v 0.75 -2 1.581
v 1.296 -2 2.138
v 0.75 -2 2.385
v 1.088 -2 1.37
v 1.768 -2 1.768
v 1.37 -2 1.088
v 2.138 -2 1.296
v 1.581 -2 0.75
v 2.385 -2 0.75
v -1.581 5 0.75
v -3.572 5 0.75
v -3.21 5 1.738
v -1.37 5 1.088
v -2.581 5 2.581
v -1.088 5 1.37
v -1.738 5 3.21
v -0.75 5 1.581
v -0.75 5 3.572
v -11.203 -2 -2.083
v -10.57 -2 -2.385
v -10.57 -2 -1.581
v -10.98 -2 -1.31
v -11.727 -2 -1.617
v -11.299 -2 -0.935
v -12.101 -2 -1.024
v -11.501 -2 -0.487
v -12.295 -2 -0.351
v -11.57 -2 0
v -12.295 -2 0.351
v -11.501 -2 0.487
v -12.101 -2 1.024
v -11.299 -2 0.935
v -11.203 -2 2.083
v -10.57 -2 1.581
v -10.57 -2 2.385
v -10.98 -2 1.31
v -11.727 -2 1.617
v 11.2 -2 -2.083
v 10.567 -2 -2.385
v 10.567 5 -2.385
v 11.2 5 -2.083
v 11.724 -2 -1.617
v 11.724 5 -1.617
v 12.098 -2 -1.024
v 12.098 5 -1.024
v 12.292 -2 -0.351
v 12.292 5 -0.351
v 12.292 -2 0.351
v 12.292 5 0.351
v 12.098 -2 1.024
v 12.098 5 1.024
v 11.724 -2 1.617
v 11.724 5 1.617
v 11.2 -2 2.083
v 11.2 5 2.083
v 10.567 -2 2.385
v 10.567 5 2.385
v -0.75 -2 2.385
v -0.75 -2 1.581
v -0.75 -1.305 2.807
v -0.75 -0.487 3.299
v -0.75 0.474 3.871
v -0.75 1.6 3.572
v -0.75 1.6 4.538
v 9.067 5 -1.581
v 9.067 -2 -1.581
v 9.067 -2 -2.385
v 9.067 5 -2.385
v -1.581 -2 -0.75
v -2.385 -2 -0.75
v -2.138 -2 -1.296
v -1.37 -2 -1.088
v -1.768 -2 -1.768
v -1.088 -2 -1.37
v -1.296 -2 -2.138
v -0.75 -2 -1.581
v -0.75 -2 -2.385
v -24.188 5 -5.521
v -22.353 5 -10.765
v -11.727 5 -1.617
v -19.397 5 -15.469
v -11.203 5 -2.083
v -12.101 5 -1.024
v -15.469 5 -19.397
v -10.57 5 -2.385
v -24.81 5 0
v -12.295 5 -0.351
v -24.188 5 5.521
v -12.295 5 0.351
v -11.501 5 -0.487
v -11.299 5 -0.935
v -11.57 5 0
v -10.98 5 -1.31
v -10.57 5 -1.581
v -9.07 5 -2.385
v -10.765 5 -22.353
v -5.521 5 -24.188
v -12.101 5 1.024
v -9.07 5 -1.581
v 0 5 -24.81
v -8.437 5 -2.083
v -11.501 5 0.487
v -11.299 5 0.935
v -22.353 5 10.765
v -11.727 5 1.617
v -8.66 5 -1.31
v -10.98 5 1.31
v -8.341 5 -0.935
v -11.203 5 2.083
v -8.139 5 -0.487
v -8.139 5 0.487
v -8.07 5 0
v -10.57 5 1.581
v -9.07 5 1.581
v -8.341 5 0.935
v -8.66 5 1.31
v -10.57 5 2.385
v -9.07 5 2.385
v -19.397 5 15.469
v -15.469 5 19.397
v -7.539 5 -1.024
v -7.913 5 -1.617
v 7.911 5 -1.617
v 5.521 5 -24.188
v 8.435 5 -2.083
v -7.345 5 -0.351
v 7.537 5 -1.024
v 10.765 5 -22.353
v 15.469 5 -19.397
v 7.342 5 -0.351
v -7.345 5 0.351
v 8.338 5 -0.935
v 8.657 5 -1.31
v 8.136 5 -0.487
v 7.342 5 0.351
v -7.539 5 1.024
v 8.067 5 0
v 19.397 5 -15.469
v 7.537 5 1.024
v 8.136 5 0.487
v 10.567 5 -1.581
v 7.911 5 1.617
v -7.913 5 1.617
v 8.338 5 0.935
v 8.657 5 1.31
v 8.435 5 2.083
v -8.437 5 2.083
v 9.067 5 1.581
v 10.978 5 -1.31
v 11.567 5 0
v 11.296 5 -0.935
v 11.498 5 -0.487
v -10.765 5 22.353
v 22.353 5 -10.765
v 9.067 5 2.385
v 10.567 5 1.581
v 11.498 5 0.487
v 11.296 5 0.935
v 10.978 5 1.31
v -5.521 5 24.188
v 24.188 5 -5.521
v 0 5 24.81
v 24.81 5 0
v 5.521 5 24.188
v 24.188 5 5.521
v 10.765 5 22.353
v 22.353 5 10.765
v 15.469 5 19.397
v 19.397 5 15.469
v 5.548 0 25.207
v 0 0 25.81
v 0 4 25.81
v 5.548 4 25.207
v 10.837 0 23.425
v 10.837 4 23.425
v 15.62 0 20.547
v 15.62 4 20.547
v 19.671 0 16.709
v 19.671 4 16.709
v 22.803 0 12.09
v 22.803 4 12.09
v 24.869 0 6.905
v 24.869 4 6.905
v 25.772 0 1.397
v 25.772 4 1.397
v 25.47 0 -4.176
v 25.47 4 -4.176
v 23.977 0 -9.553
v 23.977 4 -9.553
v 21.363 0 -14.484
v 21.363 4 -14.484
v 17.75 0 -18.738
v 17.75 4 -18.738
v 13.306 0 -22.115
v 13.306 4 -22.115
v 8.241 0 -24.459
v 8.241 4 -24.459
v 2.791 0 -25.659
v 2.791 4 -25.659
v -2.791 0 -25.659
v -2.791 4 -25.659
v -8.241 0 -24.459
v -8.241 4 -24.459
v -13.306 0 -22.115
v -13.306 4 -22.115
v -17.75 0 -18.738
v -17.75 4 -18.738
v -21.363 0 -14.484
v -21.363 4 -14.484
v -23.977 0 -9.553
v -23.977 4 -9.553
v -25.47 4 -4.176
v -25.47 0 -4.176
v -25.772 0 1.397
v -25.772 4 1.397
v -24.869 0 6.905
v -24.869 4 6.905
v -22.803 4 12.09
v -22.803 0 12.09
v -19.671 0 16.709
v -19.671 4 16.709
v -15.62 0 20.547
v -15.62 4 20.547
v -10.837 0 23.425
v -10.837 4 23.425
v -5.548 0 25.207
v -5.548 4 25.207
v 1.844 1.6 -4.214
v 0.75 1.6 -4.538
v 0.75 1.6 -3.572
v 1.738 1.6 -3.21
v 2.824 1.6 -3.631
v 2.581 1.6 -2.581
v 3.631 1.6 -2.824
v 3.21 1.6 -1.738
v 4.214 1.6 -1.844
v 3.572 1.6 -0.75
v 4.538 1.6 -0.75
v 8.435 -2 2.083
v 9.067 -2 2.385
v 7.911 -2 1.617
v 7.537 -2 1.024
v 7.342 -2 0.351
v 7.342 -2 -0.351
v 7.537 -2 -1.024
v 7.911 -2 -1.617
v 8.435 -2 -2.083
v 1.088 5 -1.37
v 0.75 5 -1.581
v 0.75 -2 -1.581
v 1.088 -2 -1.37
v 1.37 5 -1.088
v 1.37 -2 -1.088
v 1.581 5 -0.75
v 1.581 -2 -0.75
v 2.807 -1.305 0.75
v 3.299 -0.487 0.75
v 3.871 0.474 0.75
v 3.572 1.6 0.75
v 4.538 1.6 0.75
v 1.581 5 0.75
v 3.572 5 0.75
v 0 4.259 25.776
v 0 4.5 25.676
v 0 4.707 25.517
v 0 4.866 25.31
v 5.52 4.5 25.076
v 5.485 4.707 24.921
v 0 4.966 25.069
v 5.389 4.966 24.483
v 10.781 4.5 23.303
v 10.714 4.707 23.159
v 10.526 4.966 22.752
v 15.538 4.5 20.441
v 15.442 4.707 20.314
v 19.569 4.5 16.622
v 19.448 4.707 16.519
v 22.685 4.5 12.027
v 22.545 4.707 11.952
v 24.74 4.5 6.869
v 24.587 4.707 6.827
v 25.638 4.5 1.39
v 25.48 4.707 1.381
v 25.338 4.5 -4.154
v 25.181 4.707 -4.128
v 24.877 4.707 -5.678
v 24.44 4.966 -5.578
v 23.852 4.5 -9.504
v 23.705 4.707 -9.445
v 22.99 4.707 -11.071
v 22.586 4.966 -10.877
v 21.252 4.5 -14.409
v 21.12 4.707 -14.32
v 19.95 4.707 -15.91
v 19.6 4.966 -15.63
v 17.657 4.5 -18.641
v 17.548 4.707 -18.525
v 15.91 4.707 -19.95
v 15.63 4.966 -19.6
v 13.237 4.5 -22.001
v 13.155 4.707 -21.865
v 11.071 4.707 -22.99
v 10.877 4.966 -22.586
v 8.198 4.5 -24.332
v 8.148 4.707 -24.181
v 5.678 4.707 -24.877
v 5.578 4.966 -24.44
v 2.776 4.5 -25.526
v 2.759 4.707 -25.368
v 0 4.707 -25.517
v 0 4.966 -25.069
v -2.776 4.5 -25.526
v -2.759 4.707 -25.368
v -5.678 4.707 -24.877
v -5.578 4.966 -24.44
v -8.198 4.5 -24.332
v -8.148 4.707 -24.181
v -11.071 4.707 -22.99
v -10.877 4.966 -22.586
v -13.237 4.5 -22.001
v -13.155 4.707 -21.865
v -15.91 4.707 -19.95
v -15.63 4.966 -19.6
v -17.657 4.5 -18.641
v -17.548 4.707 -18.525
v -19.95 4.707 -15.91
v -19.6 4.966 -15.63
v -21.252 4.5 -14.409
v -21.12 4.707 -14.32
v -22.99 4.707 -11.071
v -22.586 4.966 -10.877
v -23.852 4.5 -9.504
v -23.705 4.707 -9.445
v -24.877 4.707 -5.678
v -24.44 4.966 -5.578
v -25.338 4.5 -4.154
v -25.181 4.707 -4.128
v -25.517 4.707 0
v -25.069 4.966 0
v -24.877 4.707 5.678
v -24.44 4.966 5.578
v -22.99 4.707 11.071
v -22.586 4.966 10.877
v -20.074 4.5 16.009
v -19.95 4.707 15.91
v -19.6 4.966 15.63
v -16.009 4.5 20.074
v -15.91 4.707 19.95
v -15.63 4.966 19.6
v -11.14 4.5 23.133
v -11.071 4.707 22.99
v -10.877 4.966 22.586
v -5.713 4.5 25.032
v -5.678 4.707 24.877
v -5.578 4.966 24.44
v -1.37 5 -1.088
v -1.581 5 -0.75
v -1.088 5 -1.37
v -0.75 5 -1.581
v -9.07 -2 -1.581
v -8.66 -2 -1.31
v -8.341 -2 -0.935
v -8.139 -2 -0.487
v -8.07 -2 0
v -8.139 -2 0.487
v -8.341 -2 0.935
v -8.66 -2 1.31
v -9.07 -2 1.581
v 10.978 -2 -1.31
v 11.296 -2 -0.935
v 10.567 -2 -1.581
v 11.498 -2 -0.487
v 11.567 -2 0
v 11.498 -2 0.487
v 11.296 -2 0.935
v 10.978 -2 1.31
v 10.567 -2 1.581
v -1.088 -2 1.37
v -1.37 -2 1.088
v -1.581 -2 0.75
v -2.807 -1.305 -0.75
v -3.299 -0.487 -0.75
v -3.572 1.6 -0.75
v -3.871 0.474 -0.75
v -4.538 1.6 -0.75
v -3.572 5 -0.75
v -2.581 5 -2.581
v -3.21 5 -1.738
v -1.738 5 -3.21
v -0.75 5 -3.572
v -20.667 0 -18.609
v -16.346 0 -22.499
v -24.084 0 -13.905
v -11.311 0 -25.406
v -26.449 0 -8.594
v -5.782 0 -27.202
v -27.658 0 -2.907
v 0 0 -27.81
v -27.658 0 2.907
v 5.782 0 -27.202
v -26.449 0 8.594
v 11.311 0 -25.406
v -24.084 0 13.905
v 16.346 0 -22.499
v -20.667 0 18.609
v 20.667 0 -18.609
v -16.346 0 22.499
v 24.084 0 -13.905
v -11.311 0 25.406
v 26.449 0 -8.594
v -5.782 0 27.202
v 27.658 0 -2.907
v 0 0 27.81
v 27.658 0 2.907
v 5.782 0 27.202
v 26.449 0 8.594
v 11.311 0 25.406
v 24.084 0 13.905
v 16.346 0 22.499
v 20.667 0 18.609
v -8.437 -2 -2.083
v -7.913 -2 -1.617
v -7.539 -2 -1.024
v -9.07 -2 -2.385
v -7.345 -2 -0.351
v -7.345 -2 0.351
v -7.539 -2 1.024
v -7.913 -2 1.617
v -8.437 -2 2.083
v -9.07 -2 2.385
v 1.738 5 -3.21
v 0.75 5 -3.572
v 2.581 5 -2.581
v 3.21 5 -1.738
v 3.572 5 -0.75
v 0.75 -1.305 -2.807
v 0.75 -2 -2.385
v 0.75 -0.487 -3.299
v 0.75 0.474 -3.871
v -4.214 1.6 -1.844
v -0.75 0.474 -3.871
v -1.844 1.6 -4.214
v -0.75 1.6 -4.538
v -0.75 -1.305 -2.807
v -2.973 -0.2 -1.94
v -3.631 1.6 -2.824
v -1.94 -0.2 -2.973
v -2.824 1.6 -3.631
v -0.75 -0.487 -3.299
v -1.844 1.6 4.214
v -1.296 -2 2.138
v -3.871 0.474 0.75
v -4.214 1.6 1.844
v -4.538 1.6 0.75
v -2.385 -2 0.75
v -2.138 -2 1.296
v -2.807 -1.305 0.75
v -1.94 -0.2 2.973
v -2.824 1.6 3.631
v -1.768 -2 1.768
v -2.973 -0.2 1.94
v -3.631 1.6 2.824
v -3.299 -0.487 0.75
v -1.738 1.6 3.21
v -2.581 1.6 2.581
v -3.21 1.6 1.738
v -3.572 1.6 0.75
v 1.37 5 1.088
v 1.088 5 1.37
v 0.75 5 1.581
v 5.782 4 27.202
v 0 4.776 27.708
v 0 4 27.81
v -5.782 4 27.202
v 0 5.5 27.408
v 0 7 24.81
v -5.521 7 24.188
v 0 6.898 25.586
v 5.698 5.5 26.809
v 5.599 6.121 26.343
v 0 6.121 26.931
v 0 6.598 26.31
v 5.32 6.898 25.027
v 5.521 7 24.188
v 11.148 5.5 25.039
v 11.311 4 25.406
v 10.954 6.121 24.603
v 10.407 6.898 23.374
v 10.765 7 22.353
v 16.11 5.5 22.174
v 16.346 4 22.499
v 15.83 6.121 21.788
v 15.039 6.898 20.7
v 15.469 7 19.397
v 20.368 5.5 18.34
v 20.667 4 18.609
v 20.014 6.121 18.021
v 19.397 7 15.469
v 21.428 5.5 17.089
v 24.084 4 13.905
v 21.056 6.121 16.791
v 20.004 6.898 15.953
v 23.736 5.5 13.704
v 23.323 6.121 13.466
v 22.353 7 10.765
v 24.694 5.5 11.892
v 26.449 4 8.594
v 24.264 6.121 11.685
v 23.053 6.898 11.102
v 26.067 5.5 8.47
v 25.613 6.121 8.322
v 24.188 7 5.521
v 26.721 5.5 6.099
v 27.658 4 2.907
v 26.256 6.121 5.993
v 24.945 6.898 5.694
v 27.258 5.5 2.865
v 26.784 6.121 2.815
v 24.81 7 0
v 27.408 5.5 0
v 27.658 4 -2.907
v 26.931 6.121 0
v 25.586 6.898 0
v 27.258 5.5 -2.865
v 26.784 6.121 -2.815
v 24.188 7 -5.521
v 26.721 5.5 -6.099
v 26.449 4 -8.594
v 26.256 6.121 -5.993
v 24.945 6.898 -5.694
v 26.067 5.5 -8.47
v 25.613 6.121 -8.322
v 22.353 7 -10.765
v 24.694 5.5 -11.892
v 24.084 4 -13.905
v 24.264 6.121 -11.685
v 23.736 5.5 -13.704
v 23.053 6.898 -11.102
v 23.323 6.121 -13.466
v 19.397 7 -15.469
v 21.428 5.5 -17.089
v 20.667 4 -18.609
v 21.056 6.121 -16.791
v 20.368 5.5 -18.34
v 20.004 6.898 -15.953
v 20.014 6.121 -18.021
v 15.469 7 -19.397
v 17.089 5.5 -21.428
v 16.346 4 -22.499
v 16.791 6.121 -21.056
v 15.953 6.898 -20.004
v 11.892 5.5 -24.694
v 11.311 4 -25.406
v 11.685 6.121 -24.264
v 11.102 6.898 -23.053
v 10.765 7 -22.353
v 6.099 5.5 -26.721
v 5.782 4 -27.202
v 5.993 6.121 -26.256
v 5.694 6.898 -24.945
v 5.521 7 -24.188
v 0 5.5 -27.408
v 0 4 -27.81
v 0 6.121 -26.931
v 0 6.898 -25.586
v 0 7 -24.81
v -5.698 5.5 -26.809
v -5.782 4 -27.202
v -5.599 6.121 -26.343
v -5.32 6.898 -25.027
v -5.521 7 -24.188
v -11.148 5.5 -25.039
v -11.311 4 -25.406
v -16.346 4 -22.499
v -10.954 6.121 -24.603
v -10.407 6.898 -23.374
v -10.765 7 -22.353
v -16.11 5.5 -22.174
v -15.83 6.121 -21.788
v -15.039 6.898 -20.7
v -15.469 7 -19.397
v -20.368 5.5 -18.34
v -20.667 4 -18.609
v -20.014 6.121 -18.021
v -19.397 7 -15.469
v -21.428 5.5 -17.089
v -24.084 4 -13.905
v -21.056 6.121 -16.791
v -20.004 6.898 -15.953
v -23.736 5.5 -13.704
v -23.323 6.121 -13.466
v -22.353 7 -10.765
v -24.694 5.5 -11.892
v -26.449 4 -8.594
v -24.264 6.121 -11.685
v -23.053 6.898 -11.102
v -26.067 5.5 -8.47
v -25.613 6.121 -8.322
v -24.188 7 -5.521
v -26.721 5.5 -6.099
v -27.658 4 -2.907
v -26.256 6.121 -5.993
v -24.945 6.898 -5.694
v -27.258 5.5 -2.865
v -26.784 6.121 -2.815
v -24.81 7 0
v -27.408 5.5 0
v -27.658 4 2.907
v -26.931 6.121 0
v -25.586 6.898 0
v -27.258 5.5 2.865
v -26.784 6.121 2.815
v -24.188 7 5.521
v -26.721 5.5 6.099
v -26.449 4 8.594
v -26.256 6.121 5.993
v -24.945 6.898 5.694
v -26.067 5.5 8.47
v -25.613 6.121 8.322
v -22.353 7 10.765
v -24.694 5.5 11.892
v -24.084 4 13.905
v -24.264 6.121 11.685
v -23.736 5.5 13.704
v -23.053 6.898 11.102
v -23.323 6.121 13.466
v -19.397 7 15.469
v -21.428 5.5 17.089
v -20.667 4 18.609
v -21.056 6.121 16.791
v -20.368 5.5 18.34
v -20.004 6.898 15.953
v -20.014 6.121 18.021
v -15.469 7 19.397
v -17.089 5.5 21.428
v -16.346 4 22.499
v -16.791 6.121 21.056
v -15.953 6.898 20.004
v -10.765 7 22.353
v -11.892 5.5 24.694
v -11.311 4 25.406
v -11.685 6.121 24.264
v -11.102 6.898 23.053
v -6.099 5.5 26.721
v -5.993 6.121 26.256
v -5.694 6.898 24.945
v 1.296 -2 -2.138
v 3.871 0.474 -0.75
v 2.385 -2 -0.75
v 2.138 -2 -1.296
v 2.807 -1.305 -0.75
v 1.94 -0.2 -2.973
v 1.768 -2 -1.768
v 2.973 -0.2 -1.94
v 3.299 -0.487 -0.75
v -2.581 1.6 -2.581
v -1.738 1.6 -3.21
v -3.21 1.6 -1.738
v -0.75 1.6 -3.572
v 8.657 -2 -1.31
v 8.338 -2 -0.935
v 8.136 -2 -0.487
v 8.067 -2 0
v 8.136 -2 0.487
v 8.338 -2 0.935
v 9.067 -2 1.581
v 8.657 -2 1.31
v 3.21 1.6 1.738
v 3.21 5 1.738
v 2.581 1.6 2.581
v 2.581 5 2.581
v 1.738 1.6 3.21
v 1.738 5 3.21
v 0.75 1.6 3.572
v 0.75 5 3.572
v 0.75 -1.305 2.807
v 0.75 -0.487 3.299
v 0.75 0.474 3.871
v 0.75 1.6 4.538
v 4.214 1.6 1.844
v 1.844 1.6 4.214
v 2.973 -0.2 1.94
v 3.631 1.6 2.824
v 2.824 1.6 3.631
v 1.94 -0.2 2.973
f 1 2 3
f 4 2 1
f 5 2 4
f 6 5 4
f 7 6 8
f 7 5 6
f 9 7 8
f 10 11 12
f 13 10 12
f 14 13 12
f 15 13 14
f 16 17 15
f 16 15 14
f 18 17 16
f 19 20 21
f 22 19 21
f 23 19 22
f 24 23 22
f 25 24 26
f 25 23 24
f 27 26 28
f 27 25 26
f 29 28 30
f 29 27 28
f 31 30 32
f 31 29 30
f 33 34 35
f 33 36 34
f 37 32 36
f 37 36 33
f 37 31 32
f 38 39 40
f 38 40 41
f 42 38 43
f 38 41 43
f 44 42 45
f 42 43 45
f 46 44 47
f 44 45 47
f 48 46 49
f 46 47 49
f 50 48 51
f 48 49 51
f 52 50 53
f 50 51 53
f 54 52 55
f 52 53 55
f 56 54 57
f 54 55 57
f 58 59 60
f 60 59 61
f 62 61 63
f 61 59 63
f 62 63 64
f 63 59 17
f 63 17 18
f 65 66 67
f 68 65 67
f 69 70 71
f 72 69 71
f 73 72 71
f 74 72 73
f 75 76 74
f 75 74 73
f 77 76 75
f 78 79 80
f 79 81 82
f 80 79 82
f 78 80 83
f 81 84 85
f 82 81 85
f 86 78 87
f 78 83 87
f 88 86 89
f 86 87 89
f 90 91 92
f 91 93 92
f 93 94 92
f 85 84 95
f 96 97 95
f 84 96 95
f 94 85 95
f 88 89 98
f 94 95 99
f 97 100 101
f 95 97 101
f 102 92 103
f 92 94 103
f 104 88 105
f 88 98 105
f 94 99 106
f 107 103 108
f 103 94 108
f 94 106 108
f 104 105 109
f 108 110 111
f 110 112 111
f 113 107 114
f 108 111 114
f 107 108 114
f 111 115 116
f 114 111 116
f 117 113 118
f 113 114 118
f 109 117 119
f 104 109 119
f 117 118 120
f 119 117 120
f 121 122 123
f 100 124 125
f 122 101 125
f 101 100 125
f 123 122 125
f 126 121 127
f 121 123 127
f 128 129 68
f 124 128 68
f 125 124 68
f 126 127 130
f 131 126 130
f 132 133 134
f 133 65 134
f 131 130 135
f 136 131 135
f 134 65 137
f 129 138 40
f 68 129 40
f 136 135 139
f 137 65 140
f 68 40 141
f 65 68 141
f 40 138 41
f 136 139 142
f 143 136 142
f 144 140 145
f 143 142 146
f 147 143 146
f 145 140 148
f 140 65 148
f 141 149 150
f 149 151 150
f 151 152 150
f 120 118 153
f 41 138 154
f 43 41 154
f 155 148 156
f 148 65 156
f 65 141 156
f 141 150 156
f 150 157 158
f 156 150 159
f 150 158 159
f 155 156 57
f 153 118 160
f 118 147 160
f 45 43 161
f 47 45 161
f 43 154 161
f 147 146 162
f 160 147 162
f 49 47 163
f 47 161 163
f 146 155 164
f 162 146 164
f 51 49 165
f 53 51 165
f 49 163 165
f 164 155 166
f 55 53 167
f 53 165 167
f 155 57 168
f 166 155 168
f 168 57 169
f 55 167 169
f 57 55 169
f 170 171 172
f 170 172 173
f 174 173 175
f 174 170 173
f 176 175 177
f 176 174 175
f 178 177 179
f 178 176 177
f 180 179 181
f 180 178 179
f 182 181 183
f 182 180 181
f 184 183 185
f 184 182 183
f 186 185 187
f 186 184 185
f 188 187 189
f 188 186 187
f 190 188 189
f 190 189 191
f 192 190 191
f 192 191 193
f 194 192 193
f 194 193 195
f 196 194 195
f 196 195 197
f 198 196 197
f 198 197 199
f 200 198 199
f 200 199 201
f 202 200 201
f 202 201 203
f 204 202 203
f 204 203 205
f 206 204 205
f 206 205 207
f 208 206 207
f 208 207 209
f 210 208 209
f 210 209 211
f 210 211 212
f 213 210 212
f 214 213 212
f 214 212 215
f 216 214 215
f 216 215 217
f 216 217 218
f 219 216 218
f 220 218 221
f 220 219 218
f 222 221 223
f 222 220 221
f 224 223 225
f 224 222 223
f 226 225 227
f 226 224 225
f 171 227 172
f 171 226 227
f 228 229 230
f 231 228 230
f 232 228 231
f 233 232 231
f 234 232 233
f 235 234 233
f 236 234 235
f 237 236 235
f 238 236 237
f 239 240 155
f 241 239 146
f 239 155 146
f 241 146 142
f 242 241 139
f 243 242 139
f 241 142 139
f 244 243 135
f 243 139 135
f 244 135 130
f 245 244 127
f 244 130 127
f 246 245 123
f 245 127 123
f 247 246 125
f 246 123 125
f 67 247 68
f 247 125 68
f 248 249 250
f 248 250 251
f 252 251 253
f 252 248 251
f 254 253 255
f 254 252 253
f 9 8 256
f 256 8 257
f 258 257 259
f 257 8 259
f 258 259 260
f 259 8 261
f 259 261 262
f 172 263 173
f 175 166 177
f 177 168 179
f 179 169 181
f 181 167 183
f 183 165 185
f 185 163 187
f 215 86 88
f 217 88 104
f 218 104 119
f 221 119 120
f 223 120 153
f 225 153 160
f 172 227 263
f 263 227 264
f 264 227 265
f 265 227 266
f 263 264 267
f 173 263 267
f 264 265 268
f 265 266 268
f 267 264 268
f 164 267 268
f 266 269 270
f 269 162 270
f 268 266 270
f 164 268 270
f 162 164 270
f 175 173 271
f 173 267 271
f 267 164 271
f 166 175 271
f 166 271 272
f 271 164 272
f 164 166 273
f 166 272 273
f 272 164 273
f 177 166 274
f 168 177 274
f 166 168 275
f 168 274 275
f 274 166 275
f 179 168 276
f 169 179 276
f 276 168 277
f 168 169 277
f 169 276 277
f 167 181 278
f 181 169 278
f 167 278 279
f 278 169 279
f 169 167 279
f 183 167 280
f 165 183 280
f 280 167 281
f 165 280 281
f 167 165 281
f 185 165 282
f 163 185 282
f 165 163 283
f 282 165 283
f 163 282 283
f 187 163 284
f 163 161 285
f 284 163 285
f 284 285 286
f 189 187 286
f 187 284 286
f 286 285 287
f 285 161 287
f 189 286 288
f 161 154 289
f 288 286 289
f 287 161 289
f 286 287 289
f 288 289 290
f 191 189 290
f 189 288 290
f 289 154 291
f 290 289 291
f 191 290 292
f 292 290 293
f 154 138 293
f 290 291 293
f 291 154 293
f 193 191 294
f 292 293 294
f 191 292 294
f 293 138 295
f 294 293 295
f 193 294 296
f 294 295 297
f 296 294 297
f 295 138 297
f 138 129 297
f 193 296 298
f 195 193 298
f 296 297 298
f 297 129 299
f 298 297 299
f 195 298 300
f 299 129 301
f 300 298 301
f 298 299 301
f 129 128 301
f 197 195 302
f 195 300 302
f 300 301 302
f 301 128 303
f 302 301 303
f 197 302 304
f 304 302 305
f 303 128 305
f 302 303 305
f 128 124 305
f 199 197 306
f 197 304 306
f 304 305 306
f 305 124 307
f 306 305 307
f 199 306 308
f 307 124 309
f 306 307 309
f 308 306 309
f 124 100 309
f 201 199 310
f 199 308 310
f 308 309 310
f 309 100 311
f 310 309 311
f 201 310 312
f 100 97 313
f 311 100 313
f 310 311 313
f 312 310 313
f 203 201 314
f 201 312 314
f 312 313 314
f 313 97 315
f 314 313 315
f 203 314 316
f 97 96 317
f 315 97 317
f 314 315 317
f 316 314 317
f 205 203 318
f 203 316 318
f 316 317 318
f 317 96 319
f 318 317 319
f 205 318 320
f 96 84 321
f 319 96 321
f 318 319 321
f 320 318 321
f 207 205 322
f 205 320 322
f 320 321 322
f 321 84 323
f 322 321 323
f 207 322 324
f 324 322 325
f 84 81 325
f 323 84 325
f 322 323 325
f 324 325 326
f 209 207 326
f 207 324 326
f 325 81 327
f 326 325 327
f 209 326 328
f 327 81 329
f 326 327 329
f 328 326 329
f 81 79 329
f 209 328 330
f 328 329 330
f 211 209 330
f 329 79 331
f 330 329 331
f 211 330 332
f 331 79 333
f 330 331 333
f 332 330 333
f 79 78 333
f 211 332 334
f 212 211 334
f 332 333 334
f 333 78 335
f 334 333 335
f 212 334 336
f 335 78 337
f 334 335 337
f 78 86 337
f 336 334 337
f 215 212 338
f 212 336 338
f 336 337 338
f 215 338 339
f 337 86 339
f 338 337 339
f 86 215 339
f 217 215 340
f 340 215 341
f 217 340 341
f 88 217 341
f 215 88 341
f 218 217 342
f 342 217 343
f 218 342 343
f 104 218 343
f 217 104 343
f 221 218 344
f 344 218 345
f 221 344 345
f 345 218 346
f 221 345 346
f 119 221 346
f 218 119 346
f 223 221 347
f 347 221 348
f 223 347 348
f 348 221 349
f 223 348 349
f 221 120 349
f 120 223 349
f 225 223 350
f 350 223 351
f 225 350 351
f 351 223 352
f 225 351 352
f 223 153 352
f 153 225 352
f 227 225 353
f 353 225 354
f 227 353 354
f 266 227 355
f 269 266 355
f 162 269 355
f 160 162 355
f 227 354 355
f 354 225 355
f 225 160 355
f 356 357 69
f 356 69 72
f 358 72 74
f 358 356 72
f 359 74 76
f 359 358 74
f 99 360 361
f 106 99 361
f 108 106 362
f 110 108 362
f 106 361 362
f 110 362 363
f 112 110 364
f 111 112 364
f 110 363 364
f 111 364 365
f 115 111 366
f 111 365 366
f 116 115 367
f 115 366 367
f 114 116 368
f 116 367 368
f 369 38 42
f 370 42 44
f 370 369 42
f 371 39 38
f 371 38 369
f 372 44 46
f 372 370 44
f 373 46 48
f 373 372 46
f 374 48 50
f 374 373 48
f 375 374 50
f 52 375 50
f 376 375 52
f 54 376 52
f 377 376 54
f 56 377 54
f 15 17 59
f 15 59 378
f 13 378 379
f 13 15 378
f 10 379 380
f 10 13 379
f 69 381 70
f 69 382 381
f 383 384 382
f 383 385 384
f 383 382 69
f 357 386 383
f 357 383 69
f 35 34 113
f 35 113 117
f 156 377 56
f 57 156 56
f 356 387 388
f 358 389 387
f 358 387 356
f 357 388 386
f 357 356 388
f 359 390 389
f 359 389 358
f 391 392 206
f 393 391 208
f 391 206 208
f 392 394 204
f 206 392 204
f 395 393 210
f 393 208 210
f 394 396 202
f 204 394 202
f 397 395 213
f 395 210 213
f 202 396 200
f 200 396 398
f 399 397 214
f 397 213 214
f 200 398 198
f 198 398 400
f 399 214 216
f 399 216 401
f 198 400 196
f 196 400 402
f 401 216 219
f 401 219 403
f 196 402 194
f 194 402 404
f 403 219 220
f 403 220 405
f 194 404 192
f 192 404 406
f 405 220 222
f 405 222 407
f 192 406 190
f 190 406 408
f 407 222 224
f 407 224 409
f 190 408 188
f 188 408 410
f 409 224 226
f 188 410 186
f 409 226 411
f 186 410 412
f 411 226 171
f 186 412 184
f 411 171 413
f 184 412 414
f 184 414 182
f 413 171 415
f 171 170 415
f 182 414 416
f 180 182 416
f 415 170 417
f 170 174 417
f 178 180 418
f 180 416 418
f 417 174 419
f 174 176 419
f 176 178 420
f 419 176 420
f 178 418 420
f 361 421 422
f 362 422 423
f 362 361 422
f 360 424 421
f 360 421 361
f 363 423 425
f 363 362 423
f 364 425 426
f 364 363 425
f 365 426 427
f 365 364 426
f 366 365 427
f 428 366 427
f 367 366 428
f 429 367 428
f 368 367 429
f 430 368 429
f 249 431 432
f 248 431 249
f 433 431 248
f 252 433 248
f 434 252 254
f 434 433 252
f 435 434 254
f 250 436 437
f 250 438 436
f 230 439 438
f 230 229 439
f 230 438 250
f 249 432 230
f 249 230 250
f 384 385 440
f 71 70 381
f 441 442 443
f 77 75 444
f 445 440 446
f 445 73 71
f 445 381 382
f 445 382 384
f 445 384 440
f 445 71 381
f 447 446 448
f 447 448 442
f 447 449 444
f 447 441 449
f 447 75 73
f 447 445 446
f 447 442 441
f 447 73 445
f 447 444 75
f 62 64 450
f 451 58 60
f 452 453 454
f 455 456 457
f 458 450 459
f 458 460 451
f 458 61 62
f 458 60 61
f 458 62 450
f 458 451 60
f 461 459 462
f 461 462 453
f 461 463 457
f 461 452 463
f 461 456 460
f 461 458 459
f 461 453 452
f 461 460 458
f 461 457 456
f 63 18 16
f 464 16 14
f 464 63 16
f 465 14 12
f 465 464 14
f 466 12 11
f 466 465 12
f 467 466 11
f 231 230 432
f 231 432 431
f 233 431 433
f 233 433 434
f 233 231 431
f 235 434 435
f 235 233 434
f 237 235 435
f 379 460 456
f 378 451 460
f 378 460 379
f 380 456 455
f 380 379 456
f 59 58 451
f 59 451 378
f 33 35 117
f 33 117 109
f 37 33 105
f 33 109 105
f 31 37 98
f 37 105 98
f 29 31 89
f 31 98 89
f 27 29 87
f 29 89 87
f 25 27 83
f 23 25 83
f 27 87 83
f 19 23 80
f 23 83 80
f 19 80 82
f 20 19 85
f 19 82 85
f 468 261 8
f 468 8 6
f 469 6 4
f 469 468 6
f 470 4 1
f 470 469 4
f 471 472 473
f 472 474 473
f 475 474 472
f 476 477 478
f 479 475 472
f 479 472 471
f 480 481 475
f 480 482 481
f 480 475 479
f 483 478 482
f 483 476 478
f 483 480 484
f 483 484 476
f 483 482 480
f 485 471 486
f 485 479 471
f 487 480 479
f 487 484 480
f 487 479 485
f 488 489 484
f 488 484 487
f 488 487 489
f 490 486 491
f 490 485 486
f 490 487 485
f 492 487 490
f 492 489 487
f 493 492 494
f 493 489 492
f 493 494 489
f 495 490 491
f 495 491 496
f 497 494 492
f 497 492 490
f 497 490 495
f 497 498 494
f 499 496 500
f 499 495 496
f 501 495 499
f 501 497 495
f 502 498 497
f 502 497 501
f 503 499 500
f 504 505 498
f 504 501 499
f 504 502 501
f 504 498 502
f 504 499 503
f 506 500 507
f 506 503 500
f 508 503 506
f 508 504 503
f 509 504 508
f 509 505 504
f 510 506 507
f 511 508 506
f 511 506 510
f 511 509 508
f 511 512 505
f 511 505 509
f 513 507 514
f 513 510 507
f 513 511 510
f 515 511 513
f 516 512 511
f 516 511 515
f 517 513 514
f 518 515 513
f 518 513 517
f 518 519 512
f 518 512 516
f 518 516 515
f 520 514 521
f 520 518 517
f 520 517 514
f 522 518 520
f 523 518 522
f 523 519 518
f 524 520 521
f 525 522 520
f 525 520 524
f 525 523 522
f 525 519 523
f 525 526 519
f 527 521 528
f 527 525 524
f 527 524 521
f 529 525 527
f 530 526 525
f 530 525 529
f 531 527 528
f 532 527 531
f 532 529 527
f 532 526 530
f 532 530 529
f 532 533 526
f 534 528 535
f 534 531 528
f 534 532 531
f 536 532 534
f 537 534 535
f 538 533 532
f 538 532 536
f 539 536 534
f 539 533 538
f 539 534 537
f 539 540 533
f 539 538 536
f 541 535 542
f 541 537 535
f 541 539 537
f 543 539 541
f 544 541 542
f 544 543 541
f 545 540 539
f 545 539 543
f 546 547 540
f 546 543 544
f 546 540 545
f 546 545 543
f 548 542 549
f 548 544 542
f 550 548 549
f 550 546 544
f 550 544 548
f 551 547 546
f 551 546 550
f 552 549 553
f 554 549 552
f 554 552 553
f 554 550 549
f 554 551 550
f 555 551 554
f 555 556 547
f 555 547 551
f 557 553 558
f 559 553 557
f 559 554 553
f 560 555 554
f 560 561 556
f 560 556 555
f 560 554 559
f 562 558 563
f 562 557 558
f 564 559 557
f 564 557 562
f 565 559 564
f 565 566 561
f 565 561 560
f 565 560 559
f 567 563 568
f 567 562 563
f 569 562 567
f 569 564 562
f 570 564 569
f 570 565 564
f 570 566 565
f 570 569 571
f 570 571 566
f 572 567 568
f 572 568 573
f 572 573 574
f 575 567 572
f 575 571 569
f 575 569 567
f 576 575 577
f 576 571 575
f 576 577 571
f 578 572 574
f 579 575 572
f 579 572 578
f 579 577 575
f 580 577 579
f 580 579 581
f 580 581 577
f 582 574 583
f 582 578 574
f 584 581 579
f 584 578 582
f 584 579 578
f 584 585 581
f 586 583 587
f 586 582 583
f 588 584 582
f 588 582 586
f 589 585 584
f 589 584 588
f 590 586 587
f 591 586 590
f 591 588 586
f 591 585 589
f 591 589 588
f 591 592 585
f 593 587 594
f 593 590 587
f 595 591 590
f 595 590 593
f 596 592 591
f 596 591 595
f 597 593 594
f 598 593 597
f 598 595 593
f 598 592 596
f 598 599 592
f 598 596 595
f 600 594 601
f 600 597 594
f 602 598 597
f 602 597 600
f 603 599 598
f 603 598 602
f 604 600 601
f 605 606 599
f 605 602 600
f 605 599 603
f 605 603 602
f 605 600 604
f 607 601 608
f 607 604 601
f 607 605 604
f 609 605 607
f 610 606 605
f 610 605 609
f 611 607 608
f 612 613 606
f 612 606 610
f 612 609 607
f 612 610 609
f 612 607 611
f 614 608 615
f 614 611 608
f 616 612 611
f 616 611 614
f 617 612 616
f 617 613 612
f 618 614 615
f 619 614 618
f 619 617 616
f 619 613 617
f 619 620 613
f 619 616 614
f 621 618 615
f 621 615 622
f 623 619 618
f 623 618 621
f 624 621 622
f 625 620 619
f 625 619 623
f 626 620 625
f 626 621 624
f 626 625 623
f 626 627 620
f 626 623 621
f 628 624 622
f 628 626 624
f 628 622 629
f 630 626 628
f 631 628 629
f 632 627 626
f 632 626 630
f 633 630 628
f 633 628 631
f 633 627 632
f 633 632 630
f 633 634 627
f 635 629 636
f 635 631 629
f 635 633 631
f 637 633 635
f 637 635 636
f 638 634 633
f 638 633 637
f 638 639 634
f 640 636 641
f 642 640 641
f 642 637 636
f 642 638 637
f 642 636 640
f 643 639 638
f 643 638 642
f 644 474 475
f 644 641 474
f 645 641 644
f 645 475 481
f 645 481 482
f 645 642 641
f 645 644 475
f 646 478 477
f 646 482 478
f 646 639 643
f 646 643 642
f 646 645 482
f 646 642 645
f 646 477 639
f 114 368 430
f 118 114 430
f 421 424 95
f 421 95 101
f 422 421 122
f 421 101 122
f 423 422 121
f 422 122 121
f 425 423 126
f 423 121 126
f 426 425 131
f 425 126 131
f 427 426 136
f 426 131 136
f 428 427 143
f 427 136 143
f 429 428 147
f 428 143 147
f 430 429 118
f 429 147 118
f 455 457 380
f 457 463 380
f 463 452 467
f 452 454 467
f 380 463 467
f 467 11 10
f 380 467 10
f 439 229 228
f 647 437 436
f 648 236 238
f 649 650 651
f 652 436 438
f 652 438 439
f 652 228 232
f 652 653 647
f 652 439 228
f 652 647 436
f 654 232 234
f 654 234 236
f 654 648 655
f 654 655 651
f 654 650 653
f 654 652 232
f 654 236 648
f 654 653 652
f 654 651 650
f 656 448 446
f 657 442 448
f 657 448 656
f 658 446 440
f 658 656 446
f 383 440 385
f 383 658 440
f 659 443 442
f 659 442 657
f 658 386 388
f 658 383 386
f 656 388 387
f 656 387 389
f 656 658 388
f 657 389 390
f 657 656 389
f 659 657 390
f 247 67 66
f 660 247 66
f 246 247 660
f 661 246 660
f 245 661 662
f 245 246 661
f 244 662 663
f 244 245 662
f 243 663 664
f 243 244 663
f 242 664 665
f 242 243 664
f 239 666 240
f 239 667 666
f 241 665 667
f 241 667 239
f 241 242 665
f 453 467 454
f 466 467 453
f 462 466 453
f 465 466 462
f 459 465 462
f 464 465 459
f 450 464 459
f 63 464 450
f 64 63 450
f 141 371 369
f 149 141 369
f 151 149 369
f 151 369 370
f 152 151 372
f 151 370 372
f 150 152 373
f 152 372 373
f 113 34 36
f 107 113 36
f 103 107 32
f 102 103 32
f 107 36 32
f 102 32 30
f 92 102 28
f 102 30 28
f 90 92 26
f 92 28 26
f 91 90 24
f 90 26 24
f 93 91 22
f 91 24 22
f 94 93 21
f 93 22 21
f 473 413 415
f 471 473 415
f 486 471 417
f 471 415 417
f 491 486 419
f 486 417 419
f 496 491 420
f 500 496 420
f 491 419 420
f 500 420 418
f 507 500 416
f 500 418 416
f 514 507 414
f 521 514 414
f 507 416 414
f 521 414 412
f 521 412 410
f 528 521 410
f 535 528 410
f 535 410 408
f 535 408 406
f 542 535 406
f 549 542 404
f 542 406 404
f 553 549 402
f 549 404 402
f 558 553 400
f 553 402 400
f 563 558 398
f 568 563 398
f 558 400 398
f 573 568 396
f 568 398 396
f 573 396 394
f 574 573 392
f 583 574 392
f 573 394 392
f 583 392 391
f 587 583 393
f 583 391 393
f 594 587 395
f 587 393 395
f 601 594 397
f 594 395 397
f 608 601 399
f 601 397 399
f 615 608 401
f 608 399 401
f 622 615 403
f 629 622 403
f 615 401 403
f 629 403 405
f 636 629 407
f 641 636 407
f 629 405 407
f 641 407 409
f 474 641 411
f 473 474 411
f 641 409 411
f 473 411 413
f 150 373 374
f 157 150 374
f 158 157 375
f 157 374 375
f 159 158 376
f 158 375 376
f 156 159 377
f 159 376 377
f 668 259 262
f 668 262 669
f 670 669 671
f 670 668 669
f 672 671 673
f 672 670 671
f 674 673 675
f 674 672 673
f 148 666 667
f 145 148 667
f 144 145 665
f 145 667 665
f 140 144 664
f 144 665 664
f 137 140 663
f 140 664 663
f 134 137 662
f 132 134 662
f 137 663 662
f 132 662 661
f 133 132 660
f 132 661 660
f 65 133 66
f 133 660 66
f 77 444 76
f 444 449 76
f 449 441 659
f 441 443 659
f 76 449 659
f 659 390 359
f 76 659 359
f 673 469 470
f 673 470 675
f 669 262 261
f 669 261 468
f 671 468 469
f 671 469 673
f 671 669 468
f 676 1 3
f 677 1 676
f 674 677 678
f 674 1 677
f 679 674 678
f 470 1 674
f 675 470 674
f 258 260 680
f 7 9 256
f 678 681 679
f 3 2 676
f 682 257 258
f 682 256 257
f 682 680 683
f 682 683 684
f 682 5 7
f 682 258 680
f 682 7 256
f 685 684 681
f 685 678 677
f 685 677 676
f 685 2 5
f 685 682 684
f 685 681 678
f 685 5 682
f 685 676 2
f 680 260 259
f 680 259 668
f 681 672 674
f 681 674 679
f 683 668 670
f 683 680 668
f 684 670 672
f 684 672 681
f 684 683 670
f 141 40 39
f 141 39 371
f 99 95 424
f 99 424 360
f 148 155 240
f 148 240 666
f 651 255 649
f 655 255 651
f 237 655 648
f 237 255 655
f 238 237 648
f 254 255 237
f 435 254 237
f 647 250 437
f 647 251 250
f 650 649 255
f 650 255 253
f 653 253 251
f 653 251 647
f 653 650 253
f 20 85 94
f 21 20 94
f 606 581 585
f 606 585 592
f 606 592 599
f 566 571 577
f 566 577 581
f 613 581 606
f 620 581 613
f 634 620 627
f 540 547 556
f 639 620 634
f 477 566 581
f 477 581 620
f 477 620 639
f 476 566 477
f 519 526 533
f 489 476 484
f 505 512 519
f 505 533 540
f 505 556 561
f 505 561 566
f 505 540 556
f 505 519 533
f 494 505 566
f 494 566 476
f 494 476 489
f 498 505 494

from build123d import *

# Parameters (mm, degrees)
SKETCH1_R           = 27.81
BOSS_EXTRUDE1_DEPTH = 7
FILLET1_R           = 3
SHELL6_T            = -2
SKETCH6_R           = 2.5
BOSS_EXTRUDE5_DEPTH = 7
SKETCH9_R           = 1.75
SKETCH9_W           = 1.5
SKETCH9_H           = 9.824978118
CUT_EXTRUDE1_DEPTH  = 7
CUT_EXTRUDE2_DEPTH  = 7
CUT_EXTRUDE3_START  = -7
SKETCH12_R          = 1.75
SKETCH12_W          = 1.5
SKETCH12_H          = 13.411449206
SKETCH12_W_2        = 11.847320856
SKETCH12_H_2        = 1.5
CUT_EXTRUDE3_DEPTH  = 7


with BuildPart() as part:
    # Sketch1 → Boss-Extrude1 (new body)
    with BuildSketch(Plane(origin=(0, 0, 0), x_dir=(1, 0, 0), z_dir=(0, 1, 0))):
        with Locations(Location((0, 0, 0), (0, 0, 270))):
            Circle(SKETCH1_R)
    extrude(amount=BOSS_EXTRUDE1_DEPTH)

    # Fillet1
    fillet1_edges = [part.edges().sort_by_distance(p)[0] for p in [
        (0, 7, -27.81),
    ]]
    fillet(fillet1_edges, radius=FILLET1_R)

    # Shell6
    shell6_openings = [part.faces().sort_by_distance(p)[0] for p in [
        (0, 0, 0),
    ]]
    offset(amount=SHELL6_T, openings=shell6_openings, kind=Kind.INTERSECTION)

    # Sketch6 → Boss-Extrude5 (add)
    with BuildSketch(Plane.XZ.offset(-5)):
        with Locations(Location((9.817188382, 0, 0), (0, 0, 90))):
            Circle(SKETCH6_R)
        with Locations(Location((-9.82, 0, 0), (0, 0, 90))):
            Circle(SKETCH6_R)
    extrude(amount=BOSS_EXTRUDE5_DEPTH)

    # Sketch9 → Cut-Extrude1 (cut)
    with BuildSketch(Plane.XZ.offset(2)):
        with Locations((-9.82, 0)):
            Circle(SKETCH9_R)
        with Locations((-9.82, 0)):
            Rectangle(SKETCH9_W, SKETCH9_H)
    extrude(amount=-CUT_EXTRUDE1_DEPTH, mode=Mode.SUBTRACT)

    # Sketch10 → Cut-Extrude2 (cut)
    with BuildSketch(Plane.XZ.offset(2)):
        with BuildLine():
            Line((9.067188382, 4.571331513), (9.067188382, 2.384848004))
            ThreePointArc((9.067188382, 2.384848004), (9.817188382, 2.5), (10.567188382, 2.384848004))
            Line((10.567188382, 2.384848004), (10.567188382, 4.571331513))
            Line((10.567188382, 4.571331513), (9.067188382, 4.571331513))
        make_face()
        with BuildLine():
            ThreePointArc((9.067188382, -2.384848004), (9.817188382, -2.5), (10.567188382, -2.384848004))
            Line((10.567188382, -2.384848004), (10.567188382, -1.58113883))
            ThreePointArc((10.567188382, -1.58113883), (9.817188382, -1.75), (9.067188382, -1.58113883))
            Line((9.067188382, -1.58113883), (9.067188382, -2.384848004))
        make_face()
        with BuildLine():
            ThreePointArc((10.567188382, 2.384848004), (9.817188382, 2.5), (9.067188382, 2.384848004))
            Line((9.067188382, 2.384848004), (9.067188382, 1.58113883))
            ThreePointArc((9.067188382, 1.58113883), (9.817188382, 1.75), (10.567188382, 1.58113883))
            Line((10.567188382, 1.58113883), (10.567188382, 2.384848004))
        make_face()
        with BuildLine():
            ThreePointArc((9.067188382, -1.58113883), (9.817188382, -1.75), (10.567188382, -1.58113883))
            Line((10.567188382, -1.58113883), (10.567188382, 1.58113883))
            ThreePointArc((10.567188382, 1.58113883), (9.817188382, 1.75), (9.067188382, 1.58113883))
            Line((9.067188382, 1.58113883), (9.067188382, -1.58113883))
        make_face()
        with BuildLine():
            Line((9.067188382, -4.571331513), (10.567188382, -4.571331513))
            Line((10.567188382, -4.571331513), (10.567188382, -2.384848004))
            ThreePointArc((10.567188382, -2.384848004), (9.817188382, -2.5), (9.067188382, -2.384848004))
            Line((9.067188382, -2.384848004), (9.067188382, -4.571331513))
        make_face()
        with BuildLine():
            Line((10.567188382, 1.58113883), (10.567188382, -1.58113883))
            ThreePointArc((10.567188382, -1.58113883), (11.296208328, -0.935414347), (11.567188382, 0))
            ThreePointArc((11.567188382, 0), (11.296208328, 0.935414347), (10.567188382, 1.58113883))
        make_face()
        with BuildLine():
            ThreePointArc((9.067188382, 1.58113883), (8.067188382, 0), (9.067188382, -1.58113883))
            Line((9.067188382, -1.58113883), (9.067188382, 1.58113883))
        make_face()
    extrude(amount=-CUT_EXTRUDE2_DEPTH, mode=Mode.SUBTRACT)


with BuildPart() as body_2:
    # Sketch4 → Revolve1 (revolve)
    with BuildSketch(Plane.XY, mode=Mode.PRIVATE) as revolve1_sk:
        Polygon((3.65, 7), (3.65, 3.6), (4.6, 3.6), (2.5, 0), (1.5, 0), (1.5, 7), align=None)
    revolve(revolve1_sk.sketch.rotate(Axis((0, 7.379912855, 0), (0, -1, 0)), 270), axis=Axis((0, 7.379912855, 0), (0, -1, 0)))


with BuildPart() as body_2_1:
    # Body-Move/Copy1: moved
    add(body_2.part.moved(Location((0, -2, 0))))

    # Sketch12 → Cut-Extrude3 (cut)
    with BuildSketch(Plane.XZ.offset(2).offset(CUT_EXTRUDE3_START)):
        Circle(SKETCH12_R)
        Rectangle(SKETCH12_W, SKETCH12_H)
        Rectangle(SKETCH12_W_2, SKETCH12_H_2)
    extrude(amount=CUT_EXTRUDE3_DEPTH, mode=Mode.SUBTRACT)


with BuildPart() as cut_extrude3_piece_1:
    # of the separate pieces the step leaves, piece 1, a body of its own (cut_extrude3_pieces)
    add(body_2_1.part.solids().sort_by_distance((3.57211422, 5, 0.75))[0])


with BuildPart() as cut_extrude3_piece_2:
    # of the separate pieces the step leaves, piece 2, a body of its own (cut_extrude3_pieces)
    add(body_2_1.part.solids().sort_by_distance((-3.57211422, 5, 0.75))[0])


with BuildPart() as cut_extrude3_piece_3:
    # of the separate pieces the step leaves, piece 3, a body of its own (cut_extrude3_pieces)
    add(body_2_1.part.solids().sort_by_distance((0.75, 5, -3.57211422))[0])


with BuildPart() as cut_extrude3_piece_4:
    # of the separate pieces the step leaves, piece 4, a body of its own (cut_extrude3_pieces)
    add(body_2_1.part.solids().sort_by_distance((-3.57211422, 5, -0.75))[0])


solid = Compound([part.part, cut_extrude3_piece_1.part, cut_extrude3_piece_2.part, cut_extrude3_piece_3.part, cut_extrude3_piece_4.part])
